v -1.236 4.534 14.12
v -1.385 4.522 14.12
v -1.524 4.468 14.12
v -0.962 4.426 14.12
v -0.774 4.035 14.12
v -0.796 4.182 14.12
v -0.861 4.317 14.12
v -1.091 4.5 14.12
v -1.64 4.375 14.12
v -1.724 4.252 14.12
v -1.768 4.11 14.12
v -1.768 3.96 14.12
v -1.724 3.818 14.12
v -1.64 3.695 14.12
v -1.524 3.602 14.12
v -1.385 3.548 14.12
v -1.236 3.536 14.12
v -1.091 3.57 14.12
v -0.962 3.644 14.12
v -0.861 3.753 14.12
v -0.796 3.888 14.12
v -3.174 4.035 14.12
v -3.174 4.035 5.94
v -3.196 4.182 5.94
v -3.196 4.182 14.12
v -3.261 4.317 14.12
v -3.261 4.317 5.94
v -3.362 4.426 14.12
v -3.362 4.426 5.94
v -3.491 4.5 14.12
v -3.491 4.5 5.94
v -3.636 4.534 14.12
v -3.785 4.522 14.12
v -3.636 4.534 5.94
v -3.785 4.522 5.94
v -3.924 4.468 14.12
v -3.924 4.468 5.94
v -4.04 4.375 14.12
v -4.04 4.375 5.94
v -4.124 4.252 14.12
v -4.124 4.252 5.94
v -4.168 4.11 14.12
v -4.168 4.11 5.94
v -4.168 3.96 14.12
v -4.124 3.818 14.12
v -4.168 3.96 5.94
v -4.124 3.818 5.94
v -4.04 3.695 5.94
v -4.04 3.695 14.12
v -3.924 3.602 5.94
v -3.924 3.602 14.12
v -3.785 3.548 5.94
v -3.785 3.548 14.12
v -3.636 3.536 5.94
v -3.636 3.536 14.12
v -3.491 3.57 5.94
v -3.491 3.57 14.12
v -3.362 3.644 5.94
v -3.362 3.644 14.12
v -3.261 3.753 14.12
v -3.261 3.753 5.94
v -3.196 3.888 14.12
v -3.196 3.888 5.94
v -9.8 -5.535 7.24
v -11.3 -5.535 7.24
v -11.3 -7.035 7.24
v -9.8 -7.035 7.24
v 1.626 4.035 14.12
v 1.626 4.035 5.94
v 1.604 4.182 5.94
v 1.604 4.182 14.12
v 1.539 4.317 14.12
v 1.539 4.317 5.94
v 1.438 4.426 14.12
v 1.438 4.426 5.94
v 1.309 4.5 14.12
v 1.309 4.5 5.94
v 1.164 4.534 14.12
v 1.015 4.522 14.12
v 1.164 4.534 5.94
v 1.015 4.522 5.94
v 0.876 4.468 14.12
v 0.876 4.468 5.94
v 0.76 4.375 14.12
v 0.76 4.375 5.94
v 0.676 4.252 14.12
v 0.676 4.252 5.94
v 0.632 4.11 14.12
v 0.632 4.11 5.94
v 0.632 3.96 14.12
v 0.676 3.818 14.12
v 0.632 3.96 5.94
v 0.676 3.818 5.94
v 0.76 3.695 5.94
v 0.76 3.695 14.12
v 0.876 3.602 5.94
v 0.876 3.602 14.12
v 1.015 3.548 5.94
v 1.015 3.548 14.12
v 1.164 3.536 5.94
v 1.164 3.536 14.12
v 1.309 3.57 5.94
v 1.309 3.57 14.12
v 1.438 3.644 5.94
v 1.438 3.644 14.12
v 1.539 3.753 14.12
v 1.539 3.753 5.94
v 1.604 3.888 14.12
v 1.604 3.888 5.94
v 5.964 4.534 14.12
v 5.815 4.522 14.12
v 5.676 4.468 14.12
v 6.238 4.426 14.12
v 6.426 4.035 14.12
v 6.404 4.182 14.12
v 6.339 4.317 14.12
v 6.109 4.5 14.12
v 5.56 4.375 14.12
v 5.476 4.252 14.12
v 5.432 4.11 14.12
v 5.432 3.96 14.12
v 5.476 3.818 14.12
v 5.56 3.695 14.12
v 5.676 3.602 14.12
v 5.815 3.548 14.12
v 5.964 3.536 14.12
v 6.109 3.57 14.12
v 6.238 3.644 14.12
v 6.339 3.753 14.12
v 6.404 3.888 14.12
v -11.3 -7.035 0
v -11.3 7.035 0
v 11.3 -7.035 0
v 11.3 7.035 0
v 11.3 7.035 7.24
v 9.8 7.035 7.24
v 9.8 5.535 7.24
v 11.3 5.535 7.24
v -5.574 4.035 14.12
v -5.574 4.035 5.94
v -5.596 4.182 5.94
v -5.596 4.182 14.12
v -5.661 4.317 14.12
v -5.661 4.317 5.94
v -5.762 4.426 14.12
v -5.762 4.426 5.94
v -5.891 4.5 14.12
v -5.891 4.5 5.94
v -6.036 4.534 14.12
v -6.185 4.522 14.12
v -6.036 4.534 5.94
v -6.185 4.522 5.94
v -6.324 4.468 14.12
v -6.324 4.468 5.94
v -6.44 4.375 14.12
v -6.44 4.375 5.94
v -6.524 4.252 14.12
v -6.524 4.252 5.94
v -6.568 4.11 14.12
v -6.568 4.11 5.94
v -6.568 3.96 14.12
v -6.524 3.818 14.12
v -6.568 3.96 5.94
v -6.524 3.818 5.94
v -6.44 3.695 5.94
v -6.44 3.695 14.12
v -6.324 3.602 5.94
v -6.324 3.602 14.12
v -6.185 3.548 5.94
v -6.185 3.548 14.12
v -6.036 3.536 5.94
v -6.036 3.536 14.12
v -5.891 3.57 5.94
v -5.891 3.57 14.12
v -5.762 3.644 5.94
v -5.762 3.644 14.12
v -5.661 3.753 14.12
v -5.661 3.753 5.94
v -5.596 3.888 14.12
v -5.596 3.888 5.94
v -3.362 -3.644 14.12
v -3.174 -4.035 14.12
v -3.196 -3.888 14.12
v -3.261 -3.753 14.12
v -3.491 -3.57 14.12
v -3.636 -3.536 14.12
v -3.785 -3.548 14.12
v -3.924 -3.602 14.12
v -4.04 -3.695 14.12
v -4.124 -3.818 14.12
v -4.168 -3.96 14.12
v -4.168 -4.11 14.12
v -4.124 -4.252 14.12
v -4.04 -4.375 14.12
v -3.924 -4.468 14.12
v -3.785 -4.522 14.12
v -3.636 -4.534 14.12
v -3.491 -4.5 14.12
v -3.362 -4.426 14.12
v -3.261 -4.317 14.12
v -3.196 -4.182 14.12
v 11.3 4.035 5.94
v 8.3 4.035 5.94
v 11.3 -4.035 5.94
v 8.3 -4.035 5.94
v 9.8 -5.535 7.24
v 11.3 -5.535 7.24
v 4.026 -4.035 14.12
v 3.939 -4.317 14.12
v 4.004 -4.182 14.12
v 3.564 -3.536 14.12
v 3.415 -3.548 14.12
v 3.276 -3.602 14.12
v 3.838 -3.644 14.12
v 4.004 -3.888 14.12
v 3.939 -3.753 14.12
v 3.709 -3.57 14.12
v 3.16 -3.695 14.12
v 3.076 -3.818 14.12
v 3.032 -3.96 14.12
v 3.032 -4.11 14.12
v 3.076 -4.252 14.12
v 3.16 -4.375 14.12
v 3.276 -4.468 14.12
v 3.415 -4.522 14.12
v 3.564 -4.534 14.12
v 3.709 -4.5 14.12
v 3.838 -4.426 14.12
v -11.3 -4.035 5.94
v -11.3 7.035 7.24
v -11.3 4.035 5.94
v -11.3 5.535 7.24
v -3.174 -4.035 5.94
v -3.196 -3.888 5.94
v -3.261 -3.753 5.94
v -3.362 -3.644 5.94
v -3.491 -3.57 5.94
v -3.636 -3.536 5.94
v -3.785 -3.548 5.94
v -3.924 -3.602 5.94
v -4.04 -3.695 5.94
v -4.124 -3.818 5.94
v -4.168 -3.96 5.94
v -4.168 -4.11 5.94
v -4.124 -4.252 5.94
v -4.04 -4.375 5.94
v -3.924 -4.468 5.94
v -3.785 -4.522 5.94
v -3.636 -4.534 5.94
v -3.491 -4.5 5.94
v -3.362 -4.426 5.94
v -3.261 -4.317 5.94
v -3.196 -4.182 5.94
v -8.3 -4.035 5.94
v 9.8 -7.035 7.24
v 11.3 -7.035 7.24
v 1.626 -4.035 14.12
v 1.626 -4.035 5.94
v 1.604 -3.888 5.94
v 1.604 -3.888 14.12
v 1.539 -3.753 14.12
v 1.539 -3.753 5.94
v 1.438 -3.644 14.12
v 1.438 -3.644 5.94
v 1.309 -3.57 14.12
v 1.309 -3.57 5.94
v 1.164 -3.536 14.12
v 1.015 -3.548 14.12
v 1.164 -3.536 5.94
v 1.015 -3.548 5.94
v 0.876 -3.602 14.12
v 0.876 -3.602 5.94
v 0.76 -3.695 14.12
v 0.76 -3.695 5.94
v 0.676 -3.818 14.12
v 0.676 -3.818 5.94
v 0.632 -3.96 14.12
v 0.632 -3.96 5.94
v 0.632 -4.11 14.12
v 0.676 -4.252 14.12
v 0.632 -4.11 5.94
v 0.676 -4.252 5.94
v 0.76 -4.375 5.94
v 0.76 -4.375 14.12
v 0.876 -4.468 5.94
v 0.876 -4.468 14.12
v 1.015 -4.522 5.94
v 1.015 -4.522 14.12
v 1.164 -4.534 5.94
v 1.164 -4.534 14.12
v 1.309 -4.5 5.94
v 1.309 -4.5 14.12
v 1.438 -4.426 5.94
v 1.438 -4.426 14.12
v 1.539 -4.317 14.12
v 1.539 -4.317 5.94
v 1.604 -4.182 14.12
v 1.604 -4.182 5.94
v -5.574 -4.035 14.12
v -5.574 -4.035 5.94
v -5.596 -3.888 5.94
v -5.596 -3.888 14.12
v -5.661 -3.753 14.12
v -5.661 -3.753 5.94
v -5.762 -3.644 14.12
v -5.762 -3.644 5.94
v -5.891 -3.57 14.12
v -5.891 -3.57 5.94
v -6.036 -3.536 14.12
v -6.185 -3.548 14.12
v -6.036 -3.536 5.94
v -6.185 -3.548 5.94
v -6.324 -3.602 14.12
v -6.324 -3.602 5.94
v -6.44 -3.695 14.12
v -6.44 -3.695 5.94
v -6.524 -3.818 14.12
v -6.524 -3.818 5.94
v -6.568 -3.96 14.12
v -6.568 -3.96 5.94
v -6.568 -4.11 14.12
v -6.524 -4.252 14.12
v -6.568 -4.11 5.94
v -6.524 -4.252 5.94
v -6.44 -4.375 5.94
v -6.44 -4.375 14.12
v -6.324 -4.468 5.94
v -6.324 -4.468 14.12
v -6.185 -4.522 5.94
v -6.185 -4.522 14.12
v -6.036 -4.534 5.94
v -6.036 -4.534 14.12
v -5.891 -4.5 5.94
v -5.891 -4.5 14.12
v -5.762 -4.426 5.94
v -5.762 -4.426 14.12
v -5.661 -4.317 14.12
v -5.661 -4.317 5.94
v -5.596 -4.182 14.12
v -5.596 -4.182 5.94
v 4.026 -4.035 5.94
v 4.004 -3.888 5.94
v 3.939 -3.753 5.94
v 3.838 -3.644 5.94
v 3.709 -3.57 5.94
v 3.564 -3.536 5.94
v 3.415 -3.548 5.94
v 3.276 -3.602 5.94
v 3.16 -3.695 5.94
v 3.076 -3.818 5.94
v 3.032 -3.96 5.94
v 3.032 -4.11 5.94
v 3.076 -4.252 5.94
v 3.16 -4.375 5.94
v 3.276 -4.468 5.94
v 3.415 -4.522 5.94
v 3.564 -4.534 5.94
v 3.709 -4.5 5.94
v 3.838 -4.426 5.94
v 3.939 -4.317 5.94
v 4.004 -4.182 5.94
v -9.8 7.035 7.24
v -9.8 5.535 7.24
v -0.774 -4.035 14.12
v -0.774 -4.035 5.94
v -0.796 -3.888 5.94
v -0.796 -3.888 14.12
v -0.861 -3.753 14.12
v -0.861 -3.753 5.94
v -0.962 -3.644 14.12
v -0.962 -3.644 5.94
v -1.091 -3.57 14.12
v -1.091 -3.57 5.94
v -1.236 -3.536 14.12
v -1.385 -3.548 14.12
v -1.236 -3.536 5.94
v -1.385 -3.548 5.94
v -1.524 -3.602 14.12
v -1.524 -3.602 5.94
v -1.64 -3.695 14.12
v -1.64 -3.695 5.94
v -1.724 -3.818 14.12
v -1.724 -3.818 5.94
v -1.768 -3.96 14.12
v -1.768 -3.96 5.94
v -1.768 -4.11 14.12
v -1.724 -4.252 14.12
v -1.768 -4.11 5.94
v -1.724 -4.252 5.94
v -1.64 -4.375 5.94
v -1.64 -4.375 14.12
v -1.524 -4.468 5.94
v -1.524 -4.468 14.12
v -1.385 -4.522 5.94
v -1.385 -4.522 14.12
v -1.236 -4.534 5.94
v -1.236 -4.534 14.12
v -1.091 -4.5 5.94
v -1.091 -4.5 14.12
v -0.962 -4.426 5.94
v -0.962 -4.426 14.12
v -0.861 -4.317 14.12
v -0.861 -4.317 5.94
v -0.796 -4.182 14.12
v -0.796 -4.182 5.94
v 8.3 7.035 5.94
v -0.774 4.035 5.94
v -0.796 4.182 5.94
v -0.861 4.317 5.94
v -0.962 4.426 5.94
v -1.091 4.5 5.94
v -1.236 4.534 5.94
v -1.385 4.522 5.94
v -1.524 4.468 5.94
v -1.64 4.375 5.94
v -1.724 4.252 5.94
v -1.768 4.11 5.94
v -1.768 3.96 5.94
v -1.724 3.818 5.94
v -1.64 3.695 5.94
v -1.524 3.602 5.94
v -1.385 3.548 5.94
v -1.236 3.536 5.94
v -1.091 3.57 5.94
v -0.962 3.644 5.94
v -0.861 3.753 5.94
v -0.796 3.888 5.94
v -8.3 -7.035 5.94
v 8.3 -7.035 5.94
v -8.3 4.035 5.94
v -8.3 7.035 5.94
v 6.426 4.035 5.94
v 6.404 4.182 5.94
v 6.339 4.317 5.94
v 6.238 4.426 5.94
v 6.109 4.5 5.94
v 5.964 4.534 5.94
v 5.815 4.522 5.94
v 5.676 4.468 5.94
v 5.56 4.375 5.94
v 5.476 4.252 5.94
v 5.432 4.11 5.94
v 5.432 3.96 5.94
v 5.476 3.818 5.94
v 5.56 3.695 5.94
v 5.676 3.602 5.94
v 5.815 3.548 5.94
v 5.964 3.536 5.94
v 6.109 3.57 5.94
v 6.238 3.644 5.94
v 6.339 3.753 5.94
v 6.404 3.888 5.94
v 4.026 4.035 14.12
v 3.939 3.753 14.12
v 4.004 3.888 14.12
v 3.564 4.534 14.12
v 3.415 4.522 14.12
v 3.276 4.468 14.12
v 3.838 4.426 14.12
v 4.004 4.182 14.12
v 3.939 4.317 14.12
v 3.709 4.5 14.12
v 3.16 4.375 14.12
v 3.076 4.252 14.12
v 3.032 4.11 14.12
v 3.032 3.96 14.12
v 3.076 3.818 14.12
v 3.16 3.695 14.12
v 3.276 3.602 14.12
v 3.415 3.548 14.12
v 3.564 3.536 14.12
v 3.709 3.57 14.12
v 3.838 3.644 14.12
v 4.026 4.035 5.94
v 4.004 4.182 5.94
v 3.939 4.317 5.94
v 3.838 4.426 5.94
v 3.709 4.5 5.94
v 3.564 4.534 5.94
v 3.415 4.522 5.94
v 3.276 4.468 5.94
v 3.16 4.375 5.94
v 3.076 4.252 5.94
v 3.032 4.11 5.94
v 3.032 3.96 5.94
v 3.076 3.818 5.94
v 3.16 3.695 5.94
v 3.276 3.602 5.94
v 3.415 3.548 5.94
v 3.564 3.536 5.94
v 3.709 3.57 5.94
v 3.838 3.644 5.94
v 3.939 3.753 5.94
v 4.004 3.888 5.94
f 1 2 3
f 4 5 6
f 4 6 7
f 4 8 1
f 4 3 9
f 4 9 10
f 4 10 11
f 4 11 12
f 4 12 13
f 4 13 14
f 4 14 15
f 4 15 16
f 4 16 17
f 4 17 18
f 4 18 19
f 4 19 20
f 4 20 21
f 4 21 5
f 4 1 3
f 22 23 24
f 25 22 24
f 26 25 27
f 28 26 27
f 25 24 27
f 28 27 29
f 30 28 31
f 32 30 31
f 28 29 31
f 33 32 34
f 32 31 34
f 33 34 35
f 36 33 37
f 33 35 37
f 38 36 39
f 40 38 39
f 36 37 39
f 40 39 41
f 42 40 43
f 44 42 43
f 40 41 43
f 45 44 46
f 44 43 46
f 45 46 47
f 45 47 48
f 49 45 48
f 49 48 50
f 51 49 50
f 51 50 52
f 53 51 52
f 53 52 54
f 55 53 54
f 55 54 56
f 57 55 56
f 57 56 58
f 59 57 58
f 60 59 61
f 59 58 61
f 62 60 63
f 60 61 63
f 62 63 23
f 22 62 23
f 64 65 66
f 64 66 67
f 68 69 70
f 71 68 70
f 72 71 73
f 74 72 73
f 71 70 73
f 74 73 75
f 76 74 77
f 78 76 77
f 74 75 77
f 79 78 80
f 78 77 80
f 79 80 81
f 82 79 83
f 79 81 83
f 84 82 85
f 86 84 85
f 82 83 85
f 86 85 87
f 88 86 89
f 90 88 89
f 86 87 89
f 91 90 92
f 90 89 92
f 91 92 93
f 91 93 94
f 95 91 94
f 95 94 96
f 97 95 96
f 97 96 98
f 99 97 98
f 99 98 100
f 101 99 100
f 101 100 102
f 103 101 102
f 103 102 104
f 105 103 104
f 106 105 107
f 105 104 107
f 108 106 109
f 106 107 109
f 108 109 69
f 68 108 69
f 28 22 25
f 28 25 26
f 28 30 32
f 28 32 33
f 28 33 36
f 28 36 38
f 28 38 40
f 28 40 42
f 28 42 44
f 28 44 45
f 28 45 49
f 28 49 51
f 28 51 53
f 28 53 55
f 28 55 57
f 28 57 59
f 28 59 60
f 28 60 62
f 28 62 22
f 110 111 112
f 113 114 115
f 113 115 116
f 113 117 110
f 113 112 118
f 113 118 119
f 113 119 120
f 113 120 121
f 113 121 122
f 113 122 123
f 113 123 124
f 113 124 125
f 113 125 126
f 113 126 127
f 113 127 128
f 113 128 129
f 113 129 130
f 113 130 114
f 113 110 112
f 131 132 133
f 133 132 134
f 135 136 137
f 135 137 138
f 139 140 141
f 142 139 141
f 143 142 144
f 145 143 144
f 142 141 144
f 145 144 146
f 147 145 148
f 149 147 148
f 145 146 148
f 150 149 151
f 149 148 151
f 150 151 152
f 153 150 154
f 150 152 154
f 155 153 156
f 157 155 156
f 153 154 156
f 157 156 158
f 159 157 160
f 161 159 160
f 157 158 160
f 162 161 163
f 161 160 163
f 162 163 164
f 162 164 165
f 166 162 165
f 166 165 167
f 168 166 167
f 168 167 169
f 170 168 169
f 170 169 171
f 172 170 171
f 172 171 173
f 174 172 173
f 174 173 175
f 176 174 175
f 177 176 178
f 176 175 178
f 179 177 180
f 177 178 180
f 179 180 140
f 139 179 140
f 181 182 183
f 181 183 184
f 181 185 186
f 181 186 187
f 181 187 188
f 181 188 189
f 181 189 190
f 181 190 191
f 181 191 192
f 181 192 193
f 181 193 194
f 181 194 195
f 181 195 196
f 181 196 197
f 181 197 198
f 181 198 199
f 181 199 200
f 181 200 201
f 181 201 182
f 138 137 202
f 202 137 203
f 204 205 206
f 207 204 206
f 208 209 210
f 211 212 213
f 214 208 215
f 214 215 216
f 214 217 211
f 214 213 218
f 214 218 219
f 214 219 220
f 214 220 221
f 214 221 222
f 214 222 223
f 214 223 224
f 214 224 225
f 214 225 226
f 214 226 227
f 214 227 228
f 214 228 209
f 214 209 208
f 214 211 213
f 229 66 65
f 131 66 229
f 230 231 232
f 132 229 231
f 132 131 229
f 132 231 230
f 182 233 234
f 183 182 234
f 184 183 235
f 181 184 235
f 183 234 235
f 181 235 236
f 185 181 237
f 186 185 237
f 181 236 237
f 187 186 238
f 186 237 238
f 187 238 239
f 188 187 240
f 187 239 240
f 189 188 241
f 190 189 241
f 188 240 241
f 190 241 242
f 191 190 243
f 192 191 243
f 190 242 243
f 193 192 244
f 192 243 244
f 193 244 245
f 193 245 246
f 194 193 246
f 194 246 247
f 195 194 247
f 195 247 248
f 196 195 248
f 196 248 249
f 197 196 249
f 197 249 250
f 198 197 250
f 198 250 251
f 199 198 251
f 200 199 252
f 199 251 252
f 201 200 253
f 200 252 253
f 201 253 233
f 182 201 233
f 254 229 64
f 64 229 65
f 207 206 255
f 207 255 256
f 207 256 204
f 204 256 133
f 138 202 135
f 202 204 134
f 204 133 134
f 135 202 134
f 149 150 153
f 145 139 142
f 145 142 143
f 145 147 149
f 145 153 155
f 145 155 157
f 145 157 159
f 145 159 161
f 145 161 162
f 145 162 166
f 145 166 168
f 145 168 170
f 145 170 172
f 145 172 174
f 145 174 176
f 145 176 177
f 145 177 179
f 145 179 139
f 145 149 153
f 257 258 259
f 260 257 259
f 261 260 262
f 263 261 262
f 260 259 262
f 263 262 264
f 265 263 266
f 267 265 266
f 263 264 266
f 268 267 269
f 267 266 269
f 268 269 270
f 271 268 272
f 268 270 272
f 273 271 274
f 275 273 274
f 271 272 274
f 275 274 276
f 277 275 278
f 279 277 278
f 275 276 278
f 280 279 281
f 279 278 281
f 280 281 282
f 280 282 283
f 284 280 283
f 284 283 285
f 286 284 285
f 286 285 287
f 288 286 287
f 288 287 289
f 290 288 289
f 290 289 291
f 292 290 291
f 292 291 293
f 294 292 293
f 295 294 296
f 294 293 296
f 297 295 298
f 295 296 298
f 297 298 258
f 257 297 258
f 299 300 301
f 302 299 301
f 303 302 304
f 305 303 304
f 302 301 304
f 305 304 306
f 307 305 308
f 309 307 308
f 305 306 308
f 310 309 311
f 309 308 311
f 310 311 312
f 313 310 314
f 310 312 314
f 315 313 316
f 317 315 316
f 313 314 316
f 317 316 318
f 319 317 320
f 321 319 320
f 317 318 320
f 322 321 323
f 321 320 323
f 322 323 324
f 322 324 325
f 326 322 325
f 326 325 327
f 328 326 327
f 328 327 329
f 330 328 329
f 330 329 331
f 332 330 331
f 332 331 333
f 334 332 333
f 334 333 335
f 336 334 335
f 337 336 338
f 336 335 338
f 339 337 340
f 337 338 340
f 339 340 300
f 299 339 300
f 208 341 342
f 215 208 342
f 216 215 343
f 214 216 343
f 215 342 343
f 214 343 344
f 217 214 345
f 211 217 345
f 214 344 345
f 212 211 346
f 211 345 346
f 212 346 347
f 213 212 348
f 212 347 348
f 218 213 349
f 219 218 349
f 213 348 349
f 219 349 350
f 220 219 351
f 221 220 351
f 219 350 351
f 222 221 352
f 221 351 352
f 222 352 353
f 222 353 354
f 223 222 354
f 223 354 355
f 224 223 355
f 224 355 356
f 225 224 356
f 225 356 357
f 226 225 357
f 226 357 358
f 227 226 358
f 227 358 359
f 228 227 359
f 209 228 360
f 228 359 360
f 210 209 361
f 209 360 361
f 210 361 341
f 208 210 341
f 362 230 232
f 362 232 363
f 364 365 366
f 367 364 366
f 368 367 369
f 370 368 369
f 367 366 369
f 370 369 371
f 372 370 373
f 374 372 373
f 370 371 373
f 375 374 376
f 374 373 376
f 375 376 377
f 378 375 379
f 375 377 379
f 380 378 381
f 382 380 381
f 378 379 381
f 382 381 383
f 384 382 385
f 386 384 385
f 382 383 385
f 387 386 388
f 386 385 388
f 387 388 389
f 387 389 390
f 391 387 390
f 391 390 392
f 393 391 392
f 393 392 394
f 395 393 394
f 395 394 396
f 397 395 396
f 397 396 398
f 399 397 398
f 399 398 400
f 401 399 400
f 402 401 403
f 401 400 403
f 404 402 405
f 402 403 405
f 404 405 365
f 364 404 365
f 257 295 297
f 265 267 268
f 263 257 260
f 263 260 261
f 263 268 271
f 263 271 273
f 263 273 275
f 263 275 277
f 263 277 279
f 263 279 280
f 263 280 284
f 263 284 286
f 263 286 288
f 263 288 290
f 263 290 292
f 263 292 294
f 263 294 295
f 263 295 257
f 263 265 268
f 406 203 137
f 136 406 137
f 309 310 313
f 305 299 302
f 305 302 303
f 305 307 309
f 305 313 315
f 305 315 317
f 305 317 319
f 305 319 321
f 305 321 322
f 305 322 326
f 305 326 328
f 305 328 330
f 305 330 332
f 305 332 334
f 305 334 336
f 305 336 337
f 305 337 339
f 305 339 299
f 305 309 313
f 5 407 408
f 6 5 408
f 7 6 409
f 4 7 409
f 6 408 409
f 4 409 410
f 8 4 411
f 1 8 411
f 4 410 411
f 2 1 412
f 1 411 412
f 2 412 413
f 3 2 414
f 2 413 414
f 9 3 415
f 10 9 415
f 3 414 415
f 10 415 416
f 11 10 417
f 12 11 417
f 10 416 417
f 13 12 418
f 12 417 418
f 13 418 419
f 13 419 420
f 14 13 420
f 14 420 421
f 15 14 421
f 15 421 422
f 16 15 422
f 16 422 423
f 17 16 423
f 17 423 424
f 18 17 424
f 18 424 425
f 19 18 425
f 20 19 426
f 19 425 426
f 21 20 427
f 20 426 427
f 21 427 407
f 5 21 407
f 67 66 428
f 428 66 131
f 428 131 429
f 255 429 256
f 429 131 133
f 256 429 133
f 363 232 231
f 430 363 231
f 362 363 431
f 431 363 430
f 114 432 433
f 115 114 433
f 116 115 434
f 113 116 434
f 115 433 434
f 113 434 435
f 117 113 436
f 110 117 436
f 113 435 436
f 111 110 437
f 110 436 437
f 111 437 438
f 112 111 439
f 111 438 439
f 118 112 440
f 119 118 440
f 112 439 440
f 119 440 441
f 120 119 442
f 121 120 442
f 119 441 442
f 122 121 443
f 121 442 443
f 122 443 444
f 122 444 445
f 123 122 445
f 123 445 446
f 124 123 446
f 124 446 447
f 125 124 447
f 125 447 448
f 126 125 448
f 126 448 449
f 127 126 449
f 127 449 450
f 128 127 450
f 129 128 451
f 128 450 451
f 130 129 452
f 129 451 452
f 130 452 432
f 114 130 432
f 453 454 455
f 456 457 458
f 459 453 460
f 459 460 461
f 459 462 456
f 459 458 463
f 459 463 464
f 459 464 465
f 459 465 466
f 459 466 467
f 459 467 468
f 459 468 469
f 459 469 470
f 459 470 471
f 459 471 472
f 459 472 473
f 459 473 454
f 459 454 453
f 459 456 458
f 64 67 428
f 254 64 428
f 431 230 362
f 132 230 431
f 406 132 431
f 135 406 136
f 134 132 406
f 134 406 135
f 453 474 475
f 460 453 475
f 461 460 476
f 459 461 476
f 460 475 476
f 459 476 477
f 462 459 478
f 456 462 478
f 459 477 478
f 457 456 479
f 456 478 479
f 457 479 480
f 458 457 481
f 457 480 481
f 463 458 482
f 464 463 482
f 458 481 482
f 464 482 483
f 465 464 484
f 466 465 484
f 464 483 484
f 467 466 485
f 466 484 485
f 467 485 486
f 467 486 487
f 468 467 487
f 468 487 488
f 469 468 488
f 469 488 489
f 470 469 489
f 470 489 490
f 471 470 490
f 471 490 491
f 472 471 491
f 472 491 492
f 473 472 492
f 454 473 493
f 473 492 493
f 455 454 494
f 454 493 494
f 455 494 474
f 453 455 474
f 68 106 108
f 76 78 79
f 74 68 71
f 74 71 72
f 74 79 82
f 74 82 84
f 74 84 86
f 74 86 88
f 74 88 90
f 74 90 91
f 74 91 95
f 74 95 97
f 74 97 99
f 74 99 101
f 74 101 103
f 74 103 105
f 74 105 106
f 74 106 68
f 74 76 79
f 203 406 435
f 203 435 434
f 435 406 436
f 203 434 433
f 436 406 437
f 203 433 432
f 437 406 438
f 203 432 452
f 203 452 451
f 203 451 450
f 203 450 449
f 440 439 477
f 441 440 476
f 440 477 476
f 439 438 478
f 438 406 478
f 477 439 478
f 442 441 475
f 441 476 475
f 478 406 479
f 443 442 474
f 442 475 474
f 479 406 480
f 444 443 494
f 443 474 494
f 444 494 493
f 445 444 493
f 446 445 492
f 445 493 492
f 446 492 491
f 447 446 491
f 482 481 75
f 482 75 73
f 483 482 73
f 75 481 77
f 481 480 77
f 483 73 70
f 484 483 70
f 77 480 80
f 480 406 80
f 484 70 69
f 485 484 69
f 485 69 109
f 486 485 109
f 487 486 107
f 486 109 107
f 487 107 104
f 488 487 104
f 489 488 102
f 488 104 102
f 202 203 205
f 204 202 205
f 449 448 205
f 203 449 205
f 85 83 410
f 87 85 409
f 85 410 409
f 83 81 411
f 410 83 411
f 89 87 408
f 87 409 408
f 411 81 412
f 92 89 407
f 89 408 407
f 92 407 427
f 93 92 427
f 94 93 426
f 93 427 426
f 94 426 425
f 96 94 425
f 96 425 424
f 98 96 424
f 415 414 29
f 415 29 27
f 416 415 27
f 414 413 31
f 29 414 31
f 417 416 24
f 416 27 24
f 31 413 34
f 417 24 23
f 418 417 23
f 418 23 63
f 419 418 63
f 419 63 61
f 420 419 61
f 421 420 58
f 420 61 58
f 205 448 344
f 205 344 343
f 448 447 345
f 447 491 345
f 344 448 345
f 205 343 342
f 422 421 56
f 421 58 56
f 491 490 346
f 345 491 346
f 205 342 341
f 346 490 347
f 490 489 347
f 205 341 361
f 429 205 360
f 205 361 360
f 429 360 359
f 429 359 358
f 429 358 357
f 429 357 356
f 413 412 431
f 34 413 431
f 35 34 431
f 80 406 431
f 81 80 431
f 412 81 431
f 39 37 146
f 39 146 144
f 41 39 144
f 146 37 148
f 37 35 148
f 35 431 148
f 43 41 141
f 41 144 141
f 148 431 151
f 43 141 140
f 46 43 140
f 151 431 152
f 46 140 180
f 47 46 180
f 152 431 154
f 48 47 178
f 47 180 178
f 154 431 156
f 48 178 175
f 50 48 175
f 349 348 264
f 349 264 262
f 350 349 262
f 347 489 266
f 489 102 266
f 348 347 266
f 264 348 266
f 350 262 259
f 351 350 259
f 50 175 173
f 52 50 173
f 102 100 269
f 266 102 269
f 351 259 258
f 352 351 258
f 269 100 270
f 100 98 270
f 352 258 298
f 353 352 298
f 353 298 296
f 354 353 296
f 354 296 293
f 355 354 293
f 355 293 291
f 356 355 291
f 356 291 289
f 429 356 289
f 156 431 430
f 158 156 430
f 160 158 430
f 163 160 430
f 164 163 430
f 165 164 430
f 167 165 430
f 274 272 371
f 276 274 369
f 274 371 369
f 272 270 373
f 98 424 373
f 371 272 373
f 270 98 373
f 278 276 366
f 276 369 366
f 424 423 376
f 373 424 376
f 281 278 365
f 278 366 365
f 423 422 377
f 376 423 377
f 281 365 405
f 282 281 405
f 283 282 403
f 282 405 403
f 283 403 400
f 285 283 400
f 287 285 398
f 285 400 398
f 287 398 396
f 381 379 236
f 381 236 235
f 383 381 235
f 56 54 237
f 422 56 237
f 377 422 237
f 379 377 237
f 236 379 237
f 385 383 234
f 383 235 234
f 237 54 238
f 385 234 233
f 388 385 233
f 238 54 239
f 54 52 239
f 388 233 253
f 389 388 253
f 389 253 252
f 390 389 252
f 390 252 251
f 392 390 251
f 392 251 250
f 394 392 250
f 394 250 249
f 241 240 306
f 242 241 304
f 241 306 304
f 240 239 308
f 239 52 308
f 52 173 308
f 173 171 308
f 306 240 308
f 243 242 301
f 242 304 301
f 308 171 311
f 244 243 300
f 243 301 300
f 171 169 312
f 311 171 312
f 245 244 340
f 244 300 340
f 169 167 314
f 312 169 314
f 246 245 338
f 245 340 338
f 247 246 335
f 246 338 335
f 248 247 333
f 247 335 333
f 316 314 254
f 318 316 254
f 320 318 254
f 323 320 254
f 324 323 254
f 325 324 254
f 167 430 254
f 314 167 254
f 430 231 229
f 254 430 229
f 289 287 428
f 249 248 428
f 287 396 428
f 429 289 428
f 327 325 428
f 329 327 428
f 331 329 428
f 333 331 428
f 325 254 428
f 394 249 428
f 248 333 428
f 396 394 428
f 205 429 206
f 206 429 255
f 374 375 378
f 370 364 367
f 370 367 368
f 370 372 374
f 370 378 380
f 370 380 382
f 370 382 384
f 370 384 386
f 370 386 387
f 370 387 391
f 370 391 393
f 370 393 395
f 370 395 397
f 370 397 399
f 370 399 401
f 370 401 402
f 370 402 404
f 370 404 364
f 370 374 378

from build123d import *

# Parameters (mm, degrees)
F0_W     = 22.6
F0_H     = 14.07
F1_DEPTH = 7.24
F3_DEPTH = 25
F5_DEPTH = 25
F6_R     = 0.5
F7_DEPTH = 8.18


with BuildPart() as f1:
    # F0 (on Top) → F1 (new body)
    with BuildSketch(Plane.XY):
        Rectangle(F0_W, F0_H)
    extrude(amount=F1_DEPTH)

    # F2 (on face) → F3 (cut)
    with BuildSketch(Plane.XZ.offset(7.035)):
        Polygon((0, 7.24), (-9.8, 7.24), (-8.3, 5.94), (0, 5.94), (8.3, 5.94), (9.8, 7.24), align=None)
    extrude(amount=-F3_DEPTH, mode=Mode.SUBTRACT)

    # F4 (on face) → F5 (cut)
    with BuildSketch(Plane(origin=(-11.3, 0, 0), x_dir=(0, -1, 0), z_dir=(-1, 0, 0))):
        Polygon((0, 7.24), (-5.535, 7.24), (-4.035, 5.94), (0, 5.94), (4.035, 5.94), (5.535, 7.24), align=None)
    extrude(amount=-F5_DEPTH, mode=Mode.SUBTRACT)

    # F6 (on face) → F7 (join)
    with BuildSketch(Plane.XY.offset(5.94)):
        with Locations((-6.073824, -4.035)):
            Circle(F6_R)
        with Locations((-6.073824, 4.035)):
            Circle(F6_R)
        with Locations((-3.673824, 4.035)):
            Circle(F6_R)
        with Locations((-1.273824, 4.035)):
            Circle(F6_R)
        with Locations((1.126176, 4.035)):
            Circle(F6_R)
        with Locations((3.526176, 4.035)):
            Circle(F6_R)
        with Locations((5.926176, 4.035)):
            Circle(F6_R)
        with Locations((-3.673824, -4.035)):
            Circle(F6_R)
        with Locations((-1.273824, -4.035)):
            Circle(F6_R)
        with Locations((1.126176, -4.035)):
            Circle(F6_R)
        with Locations((3.526176, -4.035)):
            Circle(F6_R)
    extrude(amount=F7_DEPTH)


solid = f1.part
